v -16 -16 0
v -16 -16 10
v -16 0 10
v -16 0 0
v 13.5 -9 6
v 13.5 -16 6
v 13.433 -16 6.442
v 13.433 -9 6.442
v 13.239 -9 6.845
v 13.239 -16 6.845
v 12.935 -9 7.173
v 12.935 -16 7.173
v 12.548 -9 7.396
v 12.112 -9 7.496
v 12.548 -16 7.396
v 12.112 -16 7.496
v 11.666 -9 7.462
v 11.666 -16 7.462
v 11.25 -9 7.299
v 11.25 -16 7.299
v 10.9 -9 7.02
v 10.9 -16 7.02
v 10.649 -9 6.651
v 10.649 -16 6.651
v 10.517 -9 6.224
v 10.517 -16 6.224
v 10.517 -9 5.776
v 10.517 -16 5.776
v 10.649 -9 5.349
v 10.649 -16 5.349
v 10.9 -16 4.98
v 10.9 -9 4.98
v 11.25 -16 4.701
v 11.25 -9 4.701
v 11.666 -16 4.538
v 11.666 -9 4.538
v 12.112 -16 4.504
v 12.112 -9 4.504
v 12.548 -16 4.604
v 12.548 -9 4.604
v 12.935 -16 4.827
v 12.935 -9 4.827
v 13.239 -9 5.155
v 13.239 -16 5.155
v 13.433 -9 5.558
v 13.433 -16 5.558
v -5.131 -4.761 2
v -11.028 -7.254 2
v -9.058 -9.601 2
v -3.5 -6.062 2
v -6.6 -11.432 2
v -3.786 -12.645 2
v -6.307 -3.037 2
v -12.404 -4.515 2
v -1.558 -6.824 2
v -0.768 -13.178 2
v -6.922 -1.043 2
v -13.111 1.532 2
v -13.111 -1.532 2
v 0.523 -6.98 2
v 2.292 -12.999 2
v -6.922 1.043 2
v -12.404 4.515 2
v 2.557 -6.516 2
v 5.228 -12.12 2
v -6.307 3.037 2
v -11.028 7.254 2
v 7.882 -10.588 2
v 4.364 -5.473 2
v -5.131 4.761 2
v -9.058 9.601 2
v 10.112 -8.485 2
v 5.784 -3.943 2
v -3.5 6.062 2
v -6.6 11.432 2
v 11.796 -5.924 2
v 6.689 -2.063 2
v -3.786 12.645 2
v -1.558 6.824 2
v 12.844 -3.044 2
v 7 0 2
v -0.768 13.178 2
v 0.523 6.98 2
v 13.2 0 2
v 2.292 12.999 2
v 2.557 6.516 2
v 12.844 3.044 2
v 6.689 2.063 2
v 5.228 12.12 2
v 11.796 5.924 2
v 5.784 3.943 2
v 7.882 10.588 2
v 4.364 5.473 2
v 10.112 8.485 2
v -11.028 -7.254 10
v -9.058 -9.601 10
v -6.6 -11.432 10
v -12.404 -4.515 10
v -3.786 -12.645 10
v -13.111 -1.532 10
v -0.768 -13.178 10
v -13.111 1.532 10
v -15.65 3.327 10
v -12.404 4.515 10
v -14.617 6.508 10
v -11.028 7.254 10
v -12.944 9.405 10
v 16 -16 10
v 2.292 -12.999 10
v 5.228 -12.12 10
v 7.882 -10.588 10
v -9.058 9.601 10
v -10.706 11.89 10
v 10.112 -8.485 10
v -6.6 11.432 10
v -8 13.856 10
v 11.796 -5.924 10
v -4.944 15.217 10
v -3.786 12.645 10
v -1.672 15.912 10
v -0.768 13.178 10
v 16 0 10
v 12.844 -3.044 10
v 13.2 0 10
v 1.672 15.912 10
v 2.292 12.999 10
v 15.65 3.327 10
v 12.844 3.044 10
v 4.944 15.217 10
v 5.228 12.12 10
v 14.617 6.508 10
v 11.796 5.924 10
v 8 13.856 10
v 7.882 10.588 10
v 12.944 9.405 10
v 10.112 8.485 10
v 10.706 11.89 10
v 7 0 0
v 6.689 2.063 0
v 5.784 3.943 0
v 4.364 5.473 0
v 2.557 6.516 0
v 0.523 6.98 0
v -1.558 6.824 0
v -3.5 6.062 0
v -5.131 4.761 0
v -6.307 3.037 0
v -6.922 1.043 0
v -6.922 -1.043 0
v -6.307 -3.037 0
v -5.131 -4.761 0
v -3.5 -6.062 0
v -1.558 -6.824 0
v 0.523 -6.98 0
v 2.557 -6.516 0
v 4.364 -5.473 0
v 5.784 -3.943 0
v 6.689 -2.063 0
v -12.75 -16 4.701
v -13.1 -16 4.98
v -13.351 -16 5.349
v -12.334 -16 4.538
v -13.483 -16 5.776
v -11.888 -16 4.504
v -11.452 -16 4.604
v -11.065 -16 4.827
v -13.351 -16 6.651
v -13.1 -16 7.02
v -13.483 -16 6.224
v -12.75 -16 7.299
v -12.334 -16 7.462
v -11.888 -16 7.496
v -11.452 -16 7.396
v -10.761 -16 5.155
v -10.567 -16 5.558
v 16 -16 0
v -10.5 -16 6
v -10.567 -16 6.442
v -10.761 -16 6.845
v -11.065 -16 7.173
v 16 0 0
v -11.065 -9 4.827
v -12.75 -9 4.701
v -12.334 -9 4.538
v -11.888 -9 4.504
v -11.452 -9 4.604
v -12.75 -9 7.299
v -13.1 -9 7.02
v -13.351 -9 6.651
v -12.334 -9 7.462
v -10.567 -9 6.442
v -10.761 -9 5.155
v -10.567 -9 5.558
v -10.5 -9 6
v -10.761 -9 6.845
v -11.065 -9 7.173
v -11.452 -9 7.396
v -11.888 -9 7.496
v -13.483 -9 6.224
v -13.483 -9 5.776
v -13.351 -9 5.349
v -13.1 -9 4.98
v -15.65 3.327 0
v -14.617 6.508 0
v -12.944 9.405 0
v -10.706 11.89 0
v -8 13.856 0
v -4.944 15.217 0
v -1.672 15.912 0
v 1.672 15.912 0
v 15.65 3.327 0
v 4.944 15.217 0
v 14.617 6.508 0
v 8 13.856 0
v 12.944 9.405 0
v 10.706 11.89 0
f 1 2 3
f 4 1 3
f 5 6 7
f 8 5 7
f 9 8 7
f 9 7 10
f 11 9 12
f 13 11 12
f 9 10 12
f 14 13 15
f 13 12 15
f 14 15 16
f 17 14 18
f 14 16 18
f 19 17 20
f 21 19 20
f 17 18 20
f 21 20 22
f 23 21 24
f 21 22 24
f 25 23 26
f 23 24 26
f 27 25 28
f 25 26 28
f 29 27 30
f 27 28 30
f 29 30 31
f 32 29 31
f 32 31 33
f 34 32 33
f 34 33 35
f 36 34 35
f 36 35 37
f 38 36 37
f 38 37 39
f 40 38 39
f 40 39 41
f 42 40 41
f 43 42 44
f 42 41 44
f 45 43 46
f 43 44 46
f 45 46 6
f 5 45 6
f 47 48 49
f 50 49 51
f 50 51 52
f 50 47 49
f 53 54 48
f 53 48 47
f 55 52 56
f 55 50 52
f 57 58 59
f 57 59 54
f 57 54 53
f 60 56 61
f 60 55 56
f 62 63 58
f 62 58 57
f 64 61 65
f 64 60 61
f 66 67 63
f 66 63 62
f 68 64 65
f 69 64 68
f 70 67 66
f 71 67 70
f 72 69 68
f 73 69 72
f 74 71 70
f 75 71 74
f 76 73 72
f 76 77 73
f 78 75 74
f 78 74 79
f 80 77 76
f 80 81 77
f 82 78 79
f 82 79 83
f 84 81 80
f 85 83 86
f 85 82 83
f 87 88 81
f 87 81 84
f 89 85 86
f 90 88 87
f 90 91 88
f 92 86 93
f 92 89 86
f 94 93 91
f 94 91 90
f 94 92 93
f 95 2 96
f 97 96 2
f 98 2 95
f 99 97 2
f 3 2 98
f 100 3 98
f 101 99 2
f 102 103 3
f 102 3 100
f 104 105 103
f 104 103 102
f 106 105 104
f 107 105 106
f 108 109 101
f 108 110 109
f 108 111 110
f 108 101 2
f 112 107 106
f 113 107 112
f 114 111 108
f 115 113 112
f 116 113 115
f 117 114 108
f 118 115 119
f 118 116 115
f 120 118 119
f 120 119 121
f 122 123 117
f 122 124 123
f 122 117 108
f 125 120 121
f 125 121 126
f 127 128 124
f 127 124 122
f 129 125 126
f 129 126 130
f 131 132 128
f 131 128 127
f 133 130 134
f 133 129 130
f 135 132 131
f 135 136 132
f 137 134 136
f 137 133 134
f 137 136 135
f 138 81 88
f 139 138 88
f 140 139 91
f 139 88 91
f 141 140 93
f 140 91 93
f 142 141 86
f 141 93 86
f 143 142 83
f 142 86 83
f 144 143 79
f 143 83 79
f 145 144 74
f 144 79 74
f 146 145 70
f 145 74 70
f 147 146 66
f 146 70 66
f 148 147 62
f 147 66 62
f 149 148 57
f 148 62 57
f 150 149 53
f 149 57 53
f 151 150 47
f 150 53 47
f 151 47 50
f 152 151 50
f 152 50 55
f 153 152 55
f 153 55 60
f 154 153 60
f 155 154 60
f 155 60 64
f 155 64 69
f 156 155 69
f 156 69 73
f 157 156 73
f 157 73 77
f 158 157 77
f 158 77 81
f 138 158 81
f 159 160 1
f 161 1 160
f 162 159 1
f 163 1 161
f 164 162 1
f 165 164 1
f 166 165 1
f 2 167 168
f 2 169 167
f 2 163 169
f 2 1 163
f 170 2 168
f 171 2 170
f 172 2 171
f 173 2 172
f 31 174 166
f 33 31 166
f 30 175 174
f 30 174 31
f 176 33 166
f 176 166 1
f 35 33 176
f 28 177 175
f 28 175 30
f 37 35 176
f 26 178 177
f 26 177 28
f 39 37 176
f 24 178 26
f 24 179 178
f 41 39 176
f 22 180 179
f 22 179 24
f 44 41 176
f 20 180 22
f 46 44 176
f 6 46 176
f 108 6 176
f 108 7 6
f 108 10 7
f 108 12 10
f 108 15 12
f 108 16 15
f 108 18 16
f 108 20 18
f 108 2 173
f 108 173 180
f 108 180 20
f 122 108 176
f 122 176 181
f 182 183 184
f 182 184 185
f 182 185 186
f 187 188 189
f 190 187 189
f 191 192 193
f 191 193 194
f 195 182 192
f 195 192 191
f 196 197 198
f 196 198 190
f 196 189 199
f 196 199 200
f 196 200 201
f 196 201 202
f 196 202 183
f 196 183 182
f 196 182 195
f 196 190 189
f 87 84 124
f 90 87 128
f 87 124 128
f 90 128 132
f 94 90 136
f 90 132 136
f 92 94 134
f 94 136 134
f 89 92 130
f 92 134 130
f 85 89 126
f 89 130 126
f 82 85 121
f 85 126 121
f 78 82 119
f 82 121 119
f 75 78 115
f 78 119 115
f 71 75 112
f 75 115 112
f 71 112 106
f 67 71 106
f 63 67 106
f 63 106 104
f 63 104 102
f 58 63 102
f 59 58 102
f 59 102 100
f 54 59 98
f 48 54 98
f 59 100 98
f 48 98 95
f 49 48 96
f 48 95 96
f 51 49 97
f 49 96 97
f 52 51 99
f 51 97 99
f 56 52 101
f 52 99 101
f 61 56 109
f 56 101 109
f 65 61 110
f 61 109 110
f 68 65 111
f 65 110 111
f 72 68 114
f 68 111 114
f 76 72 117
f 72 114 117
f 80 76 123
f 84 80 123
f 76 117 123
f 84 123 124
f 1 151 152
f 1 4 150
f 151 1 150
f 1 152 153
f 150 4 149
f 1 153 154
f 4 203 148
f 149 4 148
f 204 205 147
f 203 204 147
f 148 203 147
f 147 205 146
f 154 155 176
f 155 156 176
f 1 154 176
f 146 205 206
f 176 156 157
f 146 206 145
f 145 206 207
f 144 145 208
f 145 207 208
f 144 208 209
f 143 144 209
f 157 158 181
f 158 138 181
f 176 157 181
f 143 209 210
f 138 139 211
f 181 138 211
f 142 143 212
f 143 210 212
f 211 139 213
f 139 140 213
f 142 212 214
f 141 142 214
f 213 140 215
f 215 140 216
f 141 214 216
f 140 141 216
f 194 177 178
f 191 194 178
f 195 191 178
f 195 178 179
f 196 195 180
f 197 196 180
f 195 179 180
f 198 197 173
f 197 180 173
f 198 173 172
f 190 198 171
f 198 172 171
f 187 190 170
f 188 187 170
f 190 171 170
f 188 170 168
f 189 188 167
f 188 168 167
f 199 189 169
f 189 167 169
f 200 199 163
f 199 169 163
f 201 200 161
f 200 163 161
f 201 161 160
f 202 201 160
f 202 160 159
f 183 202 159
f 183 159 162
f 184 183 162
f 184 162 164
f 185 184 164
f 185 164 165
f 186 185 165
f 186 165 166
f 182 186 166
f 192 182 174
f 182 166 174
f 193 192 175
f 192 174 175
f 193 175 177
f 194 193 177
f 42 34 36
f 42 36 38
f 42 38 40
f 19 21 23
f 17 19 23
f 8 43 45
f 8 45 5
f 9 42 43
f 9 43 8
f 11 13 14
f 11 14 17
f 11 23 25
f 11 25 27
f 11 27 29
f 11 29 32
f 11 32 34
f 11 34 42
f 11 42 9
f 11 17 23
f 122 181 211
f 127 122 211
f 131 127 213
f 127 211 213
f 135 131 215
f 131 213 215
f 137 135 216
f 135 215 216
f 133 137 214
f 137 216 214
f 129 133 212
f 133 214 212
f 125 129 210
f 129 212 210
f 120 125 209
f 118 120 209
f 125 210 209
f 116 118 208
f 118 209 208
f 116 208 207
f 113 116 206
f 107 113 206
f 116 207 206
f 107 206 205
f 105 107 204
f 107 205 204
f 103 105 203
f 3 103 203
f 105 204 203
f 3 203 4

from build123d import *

# Parameters (mm, degrees)
F0_R     = 16
F1_DEPTH = 10
F2_W     = 32
F2_H     = 16
F3_DEPTH = 10
F4_R     = 13.2
F5_DEPTH = 8
F6_R     = 7
F7_DEPTH = 25
F8_R     = 1.5
F9_DEPTH = 7


with BuildPart() as f1:
    # F0 (on Top) → F1 (new body)
    with BuildSketch(Plane.XY):
        Circle(F0_R)
    extrude(amount=F1_DEPTH)

    # F2 (on face) → F3 (join)
    with BuildSketch(Plane.XY.offset(10)):
        with Locations((0, -8)):
            Rectangle(F2_W, F2_H)
    extrude(amount=-F3_DEPTH)

    # F4 (on face) → F5 (cut)
    with BuildSketch(Plane.XY.offset(10)):
        Circle(F4_R)
    extrude(amount=-F5_DEPTH, mode=Mode.SUBTRACT)

    # F6 (on face) → F7 (cut)
    with BuildSketch(Plane.XY.offset(2)):
        Circle(F6_R)
    extrude(amount=-F7_DEPTH, mode=Mode.SUBTRACT)

    # F8 (on face) → F9 (cut)
    with BuildSketch(Plane.XZ.offset(16)):
        with Locations((-12, 6)):
            Circle(F8_R)
        with Locations((12, 6)):
            Circle(F8_R)
    extrude(amount=-F9_DEPTH, mode=Mode.SUBTRACT)


solid = f1.part
